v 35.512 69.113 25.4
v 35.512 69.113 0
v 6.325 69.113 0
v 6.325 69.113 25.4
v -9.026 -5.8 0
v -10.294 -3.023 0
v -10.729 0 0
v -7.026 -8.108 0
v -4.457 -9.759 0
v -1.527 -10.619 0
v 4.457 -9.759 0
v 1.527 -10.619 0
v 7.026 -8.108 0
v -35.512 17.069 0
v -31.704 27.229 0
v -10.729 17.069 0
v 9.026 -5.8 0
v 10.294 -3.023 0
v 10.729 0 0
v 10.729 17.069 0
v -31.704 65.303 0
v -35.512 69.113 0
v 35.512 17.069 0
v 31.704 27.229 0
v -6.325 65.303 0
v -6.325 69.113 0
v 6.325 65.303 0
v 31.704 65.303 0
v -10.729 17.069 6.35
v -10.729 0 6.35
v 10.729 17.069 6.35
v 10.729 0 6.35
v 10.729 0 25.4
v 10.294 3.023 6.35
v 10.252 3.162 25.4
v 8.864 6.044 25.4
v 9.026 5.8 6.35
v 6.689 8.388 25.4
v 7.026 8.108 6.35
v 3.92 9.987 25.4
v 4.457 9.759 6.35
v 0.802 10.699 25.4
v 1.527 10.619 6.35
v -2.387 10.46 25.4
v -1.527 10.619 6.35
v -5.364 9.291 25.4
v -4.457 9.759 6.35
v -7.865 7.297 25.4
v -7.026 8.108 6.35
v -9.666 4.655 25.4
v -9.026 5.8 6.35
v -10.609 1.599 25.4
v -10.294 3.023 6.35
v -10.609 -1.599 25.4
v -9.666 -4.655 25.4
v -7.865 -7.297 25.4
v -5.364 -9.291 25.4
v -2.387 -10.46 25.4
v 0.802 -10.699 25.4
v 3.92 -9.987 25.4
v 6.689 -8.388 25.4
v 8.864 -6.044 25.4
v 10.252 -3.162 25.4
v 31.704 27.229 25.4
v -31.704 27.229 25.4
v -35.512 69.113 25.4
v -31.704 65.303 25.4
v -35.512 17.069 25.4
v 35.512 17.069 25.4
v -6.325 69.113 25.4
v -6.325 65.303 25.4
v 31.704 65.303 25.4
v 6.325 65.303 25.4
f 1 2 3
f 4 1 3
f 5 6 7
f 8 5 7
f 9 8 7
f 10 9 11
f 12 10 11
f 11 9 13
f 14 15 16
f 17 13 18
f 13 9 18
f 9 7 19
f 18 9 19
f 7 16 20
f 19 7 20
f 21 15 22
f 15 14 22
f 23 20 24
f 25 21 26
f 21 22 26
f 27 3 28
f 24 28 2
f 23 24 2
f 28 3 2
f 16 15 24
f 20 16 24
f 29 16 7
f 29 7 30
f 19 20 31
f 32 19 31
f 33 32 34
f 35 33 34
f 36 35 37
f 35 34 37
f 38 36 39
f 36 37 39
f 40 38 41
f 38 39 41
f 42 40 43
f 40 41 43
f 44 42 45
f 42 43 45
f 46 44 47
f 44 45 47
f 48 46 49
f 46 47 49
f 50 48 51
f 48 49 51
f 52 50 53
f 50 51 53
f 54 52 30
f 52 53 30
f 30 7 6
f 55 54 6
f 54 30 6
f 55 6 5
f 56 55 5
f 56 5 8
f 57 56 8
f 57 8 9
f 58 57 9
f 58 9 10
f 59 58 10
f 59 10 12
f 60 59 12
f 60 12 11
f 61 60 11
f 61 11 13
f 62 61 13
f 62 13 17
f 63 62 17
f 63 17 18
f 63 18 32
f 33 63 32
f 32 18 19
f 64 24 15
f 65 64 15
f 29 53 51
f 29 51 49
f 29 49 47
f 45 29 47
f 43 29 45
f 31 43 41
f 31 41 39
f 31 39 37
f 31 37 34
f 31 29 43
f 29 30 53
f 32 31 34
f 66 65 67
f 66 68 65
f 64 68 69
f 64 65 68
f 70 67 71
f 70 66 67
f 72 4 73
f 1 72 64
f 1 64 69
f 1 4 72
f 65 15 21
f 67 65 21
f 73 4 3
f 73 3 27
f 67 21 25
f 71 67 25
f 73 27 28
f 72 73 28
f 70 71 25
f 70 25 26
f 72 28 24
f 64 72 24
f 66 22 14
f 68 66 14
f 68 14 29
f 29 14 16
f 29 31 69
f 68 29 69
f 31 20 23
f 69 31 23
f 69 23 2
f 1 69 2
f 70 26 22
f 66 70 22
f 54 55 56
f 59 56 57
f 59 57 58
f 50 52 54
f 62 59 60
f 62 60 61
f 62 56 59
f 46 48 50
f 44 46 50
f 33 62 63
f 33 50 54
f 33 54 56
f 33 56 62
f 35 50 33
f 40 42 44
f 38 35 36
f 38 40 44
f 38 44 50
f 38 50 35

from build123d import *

# Parameters (mm, degrees)
SKETCH1_R             = 10.728678925
BOSS_EXTRUDE1_DEPTH   = 25.4
BOSS_EXTRUDE1_2_DEPTH = 25.4
SKETCH2_W             = 21.45735785
SKETCH2_H             = 6.35
BOSS_EXTRUDE2_DEPTH   = 17.0688


with BuildPart() as part:
    # Sketch1 → Boss-Extrude1 (new body)
    with BuildSketch(Plane.XY):
        Circle(SKETCH1_R)
    extrude(amount=BOSS_EXTRUDE1_DEPTH)



with BuildPart() as body_2:
    # Sketch1 → Boss-Extrude1 2 (new body)
    with BuildSketch(Plane.XY):
        Polygon((-35.51174, 17.0688), (35.51174, 17.0688), (35.51174, 69.1134), (6.3246, 69.1134), (6.3246, 65.3034), (31.70428, 65.3034), (31.70428, 27.2288), (-31.70428, 27.2288), (-31.70428, 65.3034), (-6.3246, 65.3034), (-6.3246, 69.1134), (-35.51174, 69.1134), align=None)
    extrude(amount=BOSS_EXTRUDE1_2_DEPTH)


with BuildPart() as part_1:
    add(part.part)

    add(body_2.part)  # Boss-Extrude2 merges body 2
    # Sketch2 → Boss-Extrude2 (add)
    with BuildSketch(Plane.XZ.offset(-17.0688)):
        with Locations((0, 3.175)):
            Rectangle(SKETCH2_W, SKETCH2_H)
    extrude(amount=BOSS_EXTRUDE2_DEPTH)


solid = part_1.part
